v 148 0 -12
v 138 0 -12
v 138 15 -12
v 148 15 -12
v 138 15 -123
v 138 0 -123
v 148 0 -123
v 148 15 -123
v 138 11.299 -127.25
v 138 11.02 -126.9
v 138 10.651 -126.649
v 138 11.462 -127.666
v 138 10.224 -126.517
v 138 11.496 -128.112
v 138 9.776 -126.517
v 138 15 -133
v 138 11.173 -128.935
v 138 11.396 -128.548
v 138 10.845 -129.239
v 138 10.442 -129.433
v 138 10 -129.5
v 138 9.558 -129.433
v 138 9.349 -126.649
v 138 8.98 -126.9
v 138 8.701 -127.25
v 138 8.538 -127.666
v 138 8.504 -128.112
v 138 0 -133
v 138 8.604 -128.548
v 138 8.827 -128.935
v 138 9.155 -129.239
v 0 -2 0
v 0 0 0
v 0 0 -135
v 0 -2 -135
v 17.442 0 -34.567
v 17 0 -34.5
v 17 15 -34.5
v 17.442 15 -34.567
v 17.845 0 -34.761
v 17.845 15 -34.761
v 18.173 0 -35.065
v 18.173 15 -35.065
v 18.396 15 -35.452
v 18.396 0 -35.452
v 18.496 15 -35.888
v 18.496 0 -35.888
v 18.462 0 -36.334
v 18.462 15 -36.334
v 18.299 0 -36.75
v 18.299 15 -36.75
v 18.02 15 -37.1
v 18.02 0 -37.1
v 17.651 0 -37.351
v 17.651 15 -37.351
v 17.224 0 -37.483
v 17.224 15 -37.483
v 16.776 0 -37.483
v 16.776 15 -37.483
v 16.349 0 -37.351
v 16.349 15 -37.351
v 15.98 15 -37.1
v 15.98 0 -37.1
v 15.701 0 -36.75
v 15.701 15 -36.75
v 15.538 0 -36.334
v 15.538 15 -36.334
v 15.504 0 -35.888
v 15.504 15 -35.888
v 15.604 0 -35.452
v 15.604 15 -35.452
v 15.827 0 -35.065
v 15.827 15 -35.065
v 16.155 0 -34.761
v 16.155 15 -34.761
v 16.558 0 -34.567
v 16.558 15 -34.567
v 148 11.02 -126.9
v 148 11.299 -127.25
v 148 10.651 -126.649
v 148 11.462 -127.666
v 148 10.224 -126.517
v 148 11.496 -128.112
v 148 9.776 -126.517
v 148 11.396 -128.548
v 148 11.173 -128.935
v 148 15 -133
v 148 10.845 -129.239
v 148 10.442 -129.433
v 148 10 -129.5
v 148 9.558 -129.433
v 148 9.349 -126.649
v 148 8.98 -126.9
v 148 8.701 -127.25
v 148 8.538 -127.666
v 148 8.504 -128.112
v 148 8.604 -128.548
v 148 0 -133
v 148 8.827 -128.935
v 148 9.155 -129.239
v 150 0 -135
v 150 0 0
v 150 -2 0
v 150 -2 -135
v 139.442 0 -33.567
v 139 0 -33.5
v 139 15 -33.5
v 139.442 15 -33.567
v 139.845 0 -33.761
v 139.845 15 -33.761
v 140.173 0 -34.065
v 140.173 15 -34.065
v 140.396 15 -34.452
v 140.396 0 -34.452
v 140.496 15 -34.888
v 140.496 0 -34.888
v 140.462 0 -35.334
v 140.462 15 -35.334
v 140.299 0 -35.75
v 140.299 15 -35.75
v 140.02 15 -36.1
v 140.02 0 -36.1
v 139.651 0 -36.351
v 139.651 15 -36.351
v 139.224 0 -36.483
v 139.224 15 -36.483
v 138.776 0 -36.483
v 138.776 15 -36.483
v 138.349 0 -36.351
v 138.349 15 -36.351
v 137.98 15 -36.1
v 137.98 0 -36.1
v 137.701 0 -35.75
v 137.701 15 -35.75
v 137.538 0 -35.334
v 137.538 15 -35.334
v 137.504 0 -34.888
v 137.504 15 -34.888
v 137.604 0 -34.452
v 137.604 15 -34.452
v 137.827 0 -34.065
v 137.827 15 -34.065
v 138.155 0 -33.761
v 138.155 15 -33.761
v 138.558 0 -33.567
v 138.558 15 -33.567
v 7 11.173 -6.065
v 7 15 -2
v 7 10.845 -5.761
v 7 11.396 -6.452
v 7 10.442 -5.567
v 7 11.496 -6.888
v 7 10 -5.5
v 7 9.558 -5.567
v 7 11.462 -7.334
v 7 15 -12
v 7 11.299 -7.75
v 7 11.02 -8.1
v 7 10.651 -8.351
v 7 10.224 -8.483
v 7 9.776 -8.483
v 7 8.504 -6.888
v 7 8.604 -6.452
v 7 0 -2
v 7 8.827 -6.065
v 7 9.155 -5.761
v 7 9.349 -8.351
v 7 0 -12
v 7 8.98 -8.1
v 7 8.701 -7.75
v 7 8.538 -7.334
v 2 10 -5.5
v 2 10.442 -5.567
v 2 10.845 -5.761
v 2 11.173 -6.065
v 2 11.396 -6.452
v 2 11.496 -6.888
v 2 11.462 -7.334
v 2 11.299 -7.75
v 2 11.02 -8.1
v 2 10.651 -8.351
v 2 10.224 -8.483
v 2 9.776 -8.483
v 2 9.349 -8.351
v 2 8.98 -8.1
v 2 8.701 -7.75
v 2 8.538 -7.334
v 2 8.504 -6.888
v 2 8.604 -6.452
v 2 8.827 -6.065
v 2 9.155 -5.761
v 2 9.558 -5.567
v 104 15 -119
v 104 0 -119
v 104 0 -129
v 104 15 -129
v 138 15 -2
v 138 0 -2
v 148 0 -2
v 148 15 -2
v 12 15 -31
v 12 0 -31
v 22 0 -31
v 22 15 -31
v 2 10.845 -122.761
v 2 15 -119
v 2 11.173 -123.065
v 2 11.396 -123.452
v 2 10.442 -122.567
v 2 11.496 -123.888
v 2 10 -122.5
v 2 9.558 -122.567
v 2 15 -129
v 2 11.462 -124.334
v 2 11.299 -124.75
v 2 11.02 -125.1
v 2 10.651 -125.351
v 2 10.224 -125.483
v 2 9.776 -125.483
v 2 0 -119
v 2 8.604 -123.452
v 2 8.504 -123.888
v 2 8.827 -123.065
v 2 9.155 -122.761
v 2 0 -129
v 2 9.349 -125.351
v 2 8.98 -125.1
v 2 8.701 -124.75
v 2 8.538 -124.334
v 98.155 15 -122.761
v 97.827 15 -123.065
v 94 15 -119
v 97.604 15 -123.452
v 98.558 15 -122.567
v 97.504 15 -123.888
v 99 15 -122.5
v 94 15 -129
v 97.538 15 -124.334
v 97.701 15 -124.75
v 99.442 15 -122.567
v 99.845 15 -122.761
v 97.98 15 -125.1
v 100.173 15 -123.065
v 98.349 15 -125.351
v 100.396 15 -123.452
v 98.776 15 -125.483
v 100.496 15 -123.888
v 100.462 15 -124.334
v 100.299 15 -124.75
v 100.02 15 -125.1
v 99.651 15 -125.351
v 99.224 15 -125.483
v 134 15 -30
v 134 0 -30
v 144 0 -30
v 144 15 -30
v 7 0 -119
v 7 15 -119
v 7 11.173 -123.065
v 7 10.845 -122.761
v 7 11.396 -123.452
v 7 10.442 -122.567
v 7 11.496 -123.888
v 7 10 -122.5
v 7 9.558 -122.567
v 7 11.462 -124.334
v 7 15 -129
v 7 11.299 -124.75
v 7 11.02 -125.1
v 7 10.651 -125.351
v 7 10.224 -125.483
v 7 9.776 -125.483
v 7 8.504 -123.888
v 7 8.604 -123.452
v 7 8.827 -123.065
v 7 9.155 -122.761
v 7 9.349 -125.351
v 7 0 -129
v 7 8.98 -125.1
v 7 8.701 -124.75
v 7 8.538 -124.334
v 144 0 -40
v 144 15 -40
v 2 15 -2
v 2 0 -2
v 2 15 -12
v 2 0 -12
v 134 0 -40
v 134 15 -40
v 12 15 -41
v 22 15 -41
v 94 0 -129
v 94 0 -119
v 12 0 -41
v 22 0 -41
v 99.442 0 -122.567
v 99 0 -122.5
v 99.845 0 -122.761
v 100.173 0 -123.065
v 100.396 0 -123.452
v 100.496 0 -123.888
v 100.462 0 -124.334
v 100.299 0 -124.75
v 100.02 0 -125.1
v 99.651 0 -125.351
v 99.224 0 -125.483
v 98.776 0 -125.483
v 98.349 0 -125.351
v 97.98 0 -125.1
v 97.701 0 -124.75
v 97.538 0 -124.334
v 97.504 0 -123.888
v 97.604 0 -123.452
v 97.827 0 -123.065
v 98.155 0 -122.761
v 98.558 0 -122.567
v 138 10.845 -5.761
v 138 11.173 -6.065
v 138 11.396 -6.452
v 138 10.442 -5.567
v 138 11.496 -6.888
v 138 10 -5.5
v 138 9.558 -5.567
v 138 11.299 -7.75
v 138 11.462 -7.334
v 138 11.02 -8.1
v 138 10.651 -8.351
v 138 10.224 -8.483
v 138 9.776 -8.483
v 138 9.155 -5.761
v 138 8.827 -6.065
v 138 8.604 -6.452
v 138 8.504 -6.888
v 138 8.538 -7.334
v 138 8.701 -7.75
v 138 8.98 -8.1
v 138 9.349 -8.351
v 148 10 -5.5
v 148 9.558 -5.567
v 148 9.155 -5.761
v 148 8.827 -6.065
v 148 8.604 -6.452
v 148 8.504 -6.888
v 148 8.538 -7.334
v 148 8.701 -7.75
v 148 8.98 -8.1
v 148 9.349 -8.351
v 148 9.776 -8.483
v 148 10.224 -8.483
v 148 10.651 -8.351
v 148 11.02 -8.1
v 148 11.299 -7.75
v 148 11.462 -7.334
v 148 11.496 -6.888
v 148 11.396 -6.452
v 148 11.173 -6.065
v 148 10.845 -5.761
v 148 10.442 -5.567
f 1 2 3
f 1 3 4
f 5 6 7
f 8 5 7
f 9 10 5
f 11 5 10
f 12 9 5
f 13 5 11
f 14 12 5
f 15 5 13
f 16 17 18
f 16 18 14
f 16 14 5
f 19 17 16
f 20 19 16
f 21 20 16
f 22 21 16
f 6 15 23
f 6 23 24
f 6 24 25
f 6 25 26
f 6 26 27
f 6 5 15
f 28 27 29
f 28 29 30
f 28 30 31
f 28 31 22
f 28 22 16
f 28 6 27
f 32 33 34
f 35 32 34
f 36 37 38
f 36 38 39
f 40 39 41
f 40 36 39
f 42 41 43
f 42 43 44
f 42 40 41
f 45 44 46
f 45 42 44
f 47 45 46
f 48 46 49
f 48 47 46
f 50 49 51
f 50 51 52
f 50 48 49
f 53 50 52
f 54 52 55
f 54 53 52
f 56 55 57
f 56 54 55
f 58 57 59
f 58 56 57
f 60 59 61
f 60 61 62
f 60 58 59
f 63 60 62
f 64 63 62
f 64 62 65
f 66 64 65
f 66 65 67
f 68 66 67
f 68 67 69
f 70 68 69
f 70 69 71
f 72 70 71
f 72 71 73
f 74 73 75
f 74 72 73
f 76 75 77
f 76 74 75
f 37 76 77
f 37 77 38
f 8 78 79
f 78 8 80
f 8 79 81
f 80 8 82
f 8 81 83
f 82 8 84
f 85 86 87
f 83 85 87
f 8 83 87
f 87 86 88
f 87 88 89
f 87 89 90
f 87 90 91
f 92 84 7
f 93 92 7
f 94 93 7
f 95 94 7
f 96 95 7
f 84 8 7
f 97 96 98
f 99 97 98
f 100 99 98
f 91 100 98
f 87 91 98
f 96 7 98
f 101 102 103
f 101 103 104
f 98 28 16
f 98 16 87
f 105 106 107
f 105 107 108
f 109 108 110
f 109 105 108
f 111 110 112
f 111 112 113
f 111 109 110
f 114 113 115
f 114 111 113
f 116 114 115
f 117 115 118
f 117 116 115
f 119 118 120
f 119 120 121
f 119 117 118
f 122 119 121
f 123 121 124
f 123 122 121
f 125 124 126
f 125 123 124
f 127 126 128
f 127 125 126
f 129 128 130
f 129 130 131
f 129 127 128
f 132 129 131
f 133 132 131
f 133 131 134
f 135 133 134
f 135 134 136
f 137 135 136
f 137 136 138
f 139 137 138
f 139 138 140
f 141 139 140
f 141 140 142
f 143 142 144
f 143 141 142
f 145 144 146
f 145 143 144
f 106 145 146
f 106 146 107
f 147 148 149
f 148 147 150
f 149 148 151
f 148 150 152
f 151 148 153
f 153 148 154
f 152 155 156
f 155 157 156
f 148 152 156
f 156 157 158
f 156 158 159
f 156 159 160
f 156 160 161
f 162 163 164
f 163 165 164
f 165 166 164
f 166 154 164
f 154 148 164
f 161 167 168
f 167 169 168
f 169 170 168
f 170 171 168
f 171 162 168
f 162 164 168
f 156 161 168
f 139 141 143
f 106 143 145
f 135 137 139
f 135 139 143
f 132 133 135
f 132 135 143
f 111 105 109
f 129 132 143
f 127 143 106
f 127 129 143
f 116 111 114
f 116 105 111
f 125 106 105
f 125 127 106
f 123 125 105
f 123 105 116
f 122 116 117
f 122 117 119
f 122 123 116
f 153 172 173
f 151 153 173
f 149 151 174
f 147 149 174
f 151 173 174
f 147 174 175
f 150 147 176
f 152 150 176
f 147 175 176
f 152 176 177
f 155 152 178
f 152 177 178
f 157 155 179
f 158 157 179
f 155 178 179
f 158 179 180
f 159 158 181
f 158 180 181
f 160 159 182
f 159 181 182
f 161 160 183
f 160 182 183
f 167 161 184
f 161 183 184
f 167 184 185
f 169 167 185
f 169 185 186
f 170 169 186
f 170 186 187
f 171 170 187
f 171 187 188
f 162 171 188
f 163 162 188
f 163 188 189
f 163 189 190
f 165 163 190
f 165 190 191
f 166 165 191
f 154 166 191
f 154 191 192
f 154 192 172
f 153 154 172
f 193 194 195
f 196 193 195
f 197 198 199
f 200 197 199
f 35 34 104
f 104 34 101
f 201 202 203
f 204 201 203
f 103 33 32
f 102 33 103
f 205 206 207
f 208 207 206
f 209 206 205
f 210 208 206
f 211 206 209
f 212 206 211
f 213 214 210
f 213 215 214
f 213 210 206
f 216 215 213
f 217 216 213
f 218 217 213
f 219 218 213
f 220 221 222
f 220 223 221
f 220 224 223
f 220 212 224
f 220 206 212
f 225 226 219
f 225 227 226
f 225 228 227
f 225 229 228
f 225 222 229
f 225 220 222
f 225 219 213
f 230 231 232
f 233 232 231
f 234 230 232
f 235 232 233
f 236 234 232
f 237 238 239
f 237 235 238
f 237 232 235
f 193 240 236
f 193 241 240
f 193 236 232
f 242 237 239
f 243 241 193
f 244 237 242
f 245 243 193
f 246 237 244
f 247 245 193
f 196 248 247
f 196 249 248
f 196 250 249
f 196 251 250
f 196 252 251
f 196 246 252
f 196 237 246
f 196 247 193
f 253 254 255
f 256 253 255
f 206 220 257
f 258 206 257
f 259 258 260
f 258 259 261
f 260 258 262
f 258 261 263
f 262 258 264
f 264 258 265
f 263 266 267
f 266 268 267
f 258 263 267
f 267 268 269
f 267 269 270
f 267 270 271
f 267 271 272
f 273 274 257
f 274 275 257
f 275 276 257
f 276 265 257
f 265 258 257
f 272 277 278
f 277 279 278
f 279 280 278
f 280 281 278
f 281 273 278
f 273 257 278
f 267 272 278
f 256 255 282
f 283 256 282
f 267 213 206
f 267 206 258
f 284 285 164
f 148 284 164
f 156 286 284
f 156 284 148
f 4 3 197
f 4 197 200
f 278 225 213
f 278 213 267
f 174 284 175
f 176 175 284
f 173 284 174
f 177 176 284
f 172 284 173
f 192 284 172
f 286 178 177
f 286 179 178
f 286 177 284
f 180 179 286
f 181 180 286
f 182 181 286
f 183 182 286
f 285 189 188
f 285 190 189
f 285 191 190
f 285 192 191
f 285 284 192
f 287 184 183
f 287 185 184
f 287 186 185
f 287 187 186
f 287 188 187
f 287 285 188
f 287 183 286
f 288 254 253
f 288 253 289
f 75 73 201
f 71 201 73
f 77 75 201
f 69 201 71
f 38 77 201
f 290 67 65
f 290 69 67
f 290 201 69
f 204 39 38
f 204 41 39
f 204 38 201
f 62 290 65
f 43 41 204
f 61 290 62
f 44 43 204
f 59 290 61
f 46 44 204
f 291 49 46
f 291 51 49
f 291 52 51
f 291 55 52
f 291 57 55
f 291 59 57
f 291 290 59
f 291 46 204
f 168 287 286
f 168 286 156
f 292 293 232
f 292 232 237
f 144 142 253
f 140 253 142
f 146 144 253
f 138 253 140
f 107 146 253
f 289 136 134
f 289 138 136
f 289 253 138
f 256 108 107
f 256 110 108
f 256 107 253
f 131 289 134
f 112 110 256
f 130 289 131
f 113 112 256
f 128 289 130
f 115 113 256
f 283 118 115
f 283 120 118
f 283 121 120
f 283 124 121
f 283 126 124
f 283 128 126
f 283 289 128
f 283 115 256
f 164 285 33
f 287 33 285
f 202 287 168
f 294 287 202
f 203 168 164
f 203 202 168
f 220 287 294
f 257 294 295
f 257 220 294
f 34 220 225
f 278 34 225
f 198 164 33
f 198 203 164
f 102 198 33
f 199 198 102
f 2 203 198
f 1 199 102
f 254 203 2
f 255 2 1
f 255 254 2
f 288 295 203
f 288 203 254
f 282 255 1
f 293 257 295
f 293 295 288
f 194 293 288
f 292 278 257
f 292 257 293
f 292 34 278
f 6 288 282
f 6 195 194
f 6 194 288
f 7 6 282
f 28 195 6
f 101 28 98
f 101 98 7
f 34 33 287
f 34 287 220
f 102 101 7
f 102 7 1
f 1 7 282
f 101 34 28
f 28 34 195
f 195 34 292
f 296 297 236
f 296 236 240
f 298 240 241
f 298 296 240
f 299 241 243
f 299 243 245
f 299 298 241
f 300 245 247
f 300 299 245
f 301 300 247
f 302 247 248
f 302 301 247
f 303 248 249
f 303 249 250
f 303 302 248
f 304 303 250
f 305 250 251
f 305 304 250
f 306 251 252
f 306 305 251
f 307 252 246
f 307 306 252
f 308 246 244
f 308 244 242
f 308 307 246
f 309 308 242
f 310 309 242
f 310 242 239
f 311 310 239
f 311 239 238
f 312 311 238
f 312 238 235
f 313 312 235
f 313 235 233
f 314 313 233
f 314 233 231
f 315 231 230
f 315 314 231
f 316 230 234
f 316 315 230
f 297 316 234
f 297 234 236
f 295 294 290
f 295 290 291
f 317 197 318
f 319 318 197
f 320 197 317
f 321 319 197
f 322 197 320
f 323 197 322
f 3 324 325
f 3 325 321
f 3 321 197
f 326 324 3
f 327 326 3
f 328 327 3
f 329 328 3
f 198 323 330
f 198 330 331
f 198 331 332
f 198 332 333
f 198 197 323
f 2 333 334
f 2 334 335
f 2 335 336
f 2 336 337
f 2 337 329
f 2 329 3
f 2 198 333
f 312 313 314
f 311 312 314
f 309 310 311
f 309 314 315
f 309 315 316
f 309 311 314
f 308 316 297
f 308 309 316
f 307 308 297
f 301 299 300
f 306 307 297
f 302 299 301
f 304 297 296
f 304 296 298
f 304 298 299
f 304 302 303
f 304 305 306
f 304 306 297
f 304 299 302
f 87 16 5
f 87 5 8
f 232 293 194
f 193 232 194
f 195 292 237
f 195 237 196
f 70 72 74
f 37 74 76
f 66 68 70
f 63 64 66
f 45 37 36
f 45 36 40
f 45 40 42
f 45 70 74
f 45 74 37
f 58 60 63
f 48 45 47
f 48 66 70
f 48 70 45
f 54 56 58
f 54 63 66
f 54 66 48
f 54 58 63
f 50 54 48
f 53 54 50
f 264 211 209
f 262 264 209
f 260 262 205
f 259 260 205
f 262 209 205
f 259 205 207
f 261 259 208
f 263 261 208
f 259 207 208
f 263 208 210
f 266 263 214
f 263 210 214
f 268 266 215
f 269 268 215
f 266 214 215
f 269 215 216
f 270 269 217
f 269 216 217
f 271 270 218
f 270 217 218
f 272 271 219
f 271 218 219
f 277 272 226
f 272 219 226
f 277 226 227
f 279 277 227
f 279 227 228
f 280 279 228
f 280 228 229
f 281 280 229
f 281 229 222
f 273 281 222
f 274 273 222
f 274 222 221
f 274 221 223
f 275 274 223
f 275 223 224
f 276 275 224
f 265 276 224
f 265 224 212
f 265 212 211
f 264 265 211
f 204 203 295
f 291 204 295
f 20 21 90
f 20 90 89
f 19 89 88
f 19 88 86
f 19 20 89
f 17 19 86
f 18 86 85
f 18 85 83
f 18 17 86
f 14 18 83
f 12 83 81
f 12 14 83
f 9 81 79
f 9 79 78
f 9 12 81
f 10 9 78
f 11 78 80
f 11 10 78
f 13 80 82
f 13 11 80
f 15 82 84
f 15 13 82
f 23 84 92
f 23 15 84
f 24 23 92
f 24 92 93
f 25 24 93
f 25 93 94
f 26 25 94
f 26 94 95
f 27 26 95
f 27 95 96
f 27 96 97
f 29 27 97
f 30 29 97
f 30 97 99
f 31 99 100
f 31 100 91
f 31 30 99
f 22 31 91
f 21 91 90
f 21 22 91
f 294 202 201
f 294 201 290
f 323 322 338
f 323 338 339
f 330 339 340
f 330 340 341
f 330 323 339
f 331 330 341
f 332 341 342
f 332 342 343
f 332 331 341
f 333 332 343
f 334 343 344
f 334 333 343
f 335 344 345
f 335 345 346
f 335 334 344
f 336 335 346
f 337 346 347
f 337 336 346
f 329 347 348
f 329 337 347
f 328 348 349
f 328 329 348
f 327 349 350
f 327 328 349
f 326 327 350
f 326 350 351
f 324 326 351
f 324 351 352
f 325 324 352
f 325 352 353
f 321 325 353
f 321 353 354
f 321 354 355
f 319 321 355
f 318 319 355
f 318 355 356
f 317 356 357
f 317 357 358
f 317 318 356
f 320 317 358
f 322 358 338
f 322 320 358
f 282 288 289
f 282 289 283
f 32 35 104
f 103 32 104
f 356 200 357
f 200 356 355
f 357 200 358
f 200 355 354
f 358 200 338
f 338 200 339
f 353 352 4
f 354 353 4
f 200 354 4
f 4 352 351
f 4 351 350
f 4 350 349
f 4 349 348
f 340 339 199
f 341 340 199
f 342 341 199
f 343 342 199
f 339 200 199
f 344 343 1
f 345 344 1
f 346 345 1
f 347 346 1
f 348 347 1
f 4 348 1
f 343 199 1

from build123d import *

# Parameters (mm, degrees)
CROQUIS6_W              = 150
CROQUIS6_H              = 135
SALIENTE_EXTRUIR6_DEPTH = 2
CROQUIS8_W              = 5
CROQUIS8_H              = 10
CROQUIS8_W_2            = 10
CROQUIS8_R              = 1.5
SALIENTE_EXTRUIR7_DEPTH = 15
CROQUIS9_R              = 1.5
CORTAR_EXTRUIR1_DEPTH   = 10
CORTAR_EXTRUIR2_START   = -10
CROQUIS10_R             = 1.5
CORTAR_EXTRUIR2_DEPTH   = 10


with BuildPart() as part:
    # Croquis6 → Saliente-Extruir6 (new body)
    with BuildSketch(Plane(origin=(0, 0, 0), x_dir=(1, 0, 0), z_dir=(0, 1, 0))):
        with Locations((75, 67.5)):
            Rectangle(CROQUIS6_W, CROQUIS6_H)
    extrude(amount=-SALIENTE_EXTRUIR6_DEPTH)

    # Croquis8 → Saliente-Extruir7 (add)
    # profile 1 of 7: a face of its own
    with BuildSketch(Plane(origin=(0, 0, 0), x_dir=(1, 0, 0), z_dir=(0, 1, 0))):
        with Locations((4.5, 124)):
            Rectangle(CROQUIS8_W, CROQUIS8_H)
    # profile 2 of 7: a face of its own
    with BuildSketch(Plane(origin=(0, 0, 0), x_dir=(1, 0, 0), z_dir=(0, 1, 0))):
        with Locations((4.5, 7)):
            Rectangle(CROQUIS8_W, CROQUIS8_H)
    # profile 3 of 7: a face of its own
    with BuildSketch(Plane(origin=(0, 0, 0), x_dir=(1, 0, 0), z_dir=(0, 1, 0))):
        with Locations((143, 128)):
            Rectangle(CROQUIS8_W_2, CROQUIS8_H)
    # profile 4 of 7: a face of its own
    with BuildSketch(Plane(origin=(0, 0, 0), x_dir=(1, 0, 0), z_dir=(0, 1, 0))):
        with Locations((143, 7)):
            Rectangle(CROQUIS8_W_2, CROQUIS8_H)
    # profile 5 of 7: a face of its own
    with BuildSketch(Plane(origin=(0, 0, 0), x_dir=(1, 0, 0), z_dir=(0, 1, 0))):
        with Locations((139, 35)):
            Rectangle(CROQUIS8_W_2, CROQUIS8_H)
        with Locations(Location((139, 35, 0), (0, 0, 270))):
            Circle(CROQUIS8_R, mode=Mode.SUBTRACT)
    # profile 6 of 7: a face of its own
    with BuildSketch(Plane(origin=(0, 0, 0), x_dir=(1, 0, 0), z_dir=(0, 1, 0))):
        with Locations((17, 36)):
            Rectangle(CROQUIS8_W_2, CROQUIS8_H)
        with Locations(Location((17, 36, 0), (0, 0, 270))):
            Circle(CROQUIS8_R, mode=Mode.SUBTRACT)
    # profile 7 of 7: a face of its own
    with BuildSketch(Plane(origin=(0, 0, 0), x_dir=(1, 0, 0), z_dir=(0, 1, 0))):
        with Locations((99, 124)):
            Rectangle(CROQUIS8_W_2, CROQUIS8_H)
        with Locations(Location((99, 124, 0), (0, 0, 270))):
            Circle(CROQUIS8_R, mode=Mode.SUBTRACT)
    extrude(amount=SALIENTE_EXTRUIR7_DEPTH)

    # Croquis9 → Cortar-Extruir1 (cut)
    with BuildSketch(Plane.ZY):
        with Locations((-124, 10)):
            Circle(CROQUIS9_R)
        with Locations((-7, 10)):
            Circle(CROQUIS9_R)
    extrude(amount=-CORTAR_EXTRUIR1_DEPTH, mode=Mode.SUBTRACT)

    # Croquis10 → Cortar-Extruir2 (cut)
    with BuildSketch(Plane(origin=(148, 0, 0), x_dir=(0, 0, -1), z_dir=(1, 0, 0)).offset(CORTAR_EXTRUIR2_START)):
        with Locations(Location((7, 10, 0), (0, 0, 180))):
            Circle(CROQUIS10_R)
        with Locations((128, 10)):
            Circle(CROQUIS10_R)
    extrude(amount=CORTAR_EXTRUIR2_DEPTH, mode=Mode.SUBTRACT)


solid = part.part
